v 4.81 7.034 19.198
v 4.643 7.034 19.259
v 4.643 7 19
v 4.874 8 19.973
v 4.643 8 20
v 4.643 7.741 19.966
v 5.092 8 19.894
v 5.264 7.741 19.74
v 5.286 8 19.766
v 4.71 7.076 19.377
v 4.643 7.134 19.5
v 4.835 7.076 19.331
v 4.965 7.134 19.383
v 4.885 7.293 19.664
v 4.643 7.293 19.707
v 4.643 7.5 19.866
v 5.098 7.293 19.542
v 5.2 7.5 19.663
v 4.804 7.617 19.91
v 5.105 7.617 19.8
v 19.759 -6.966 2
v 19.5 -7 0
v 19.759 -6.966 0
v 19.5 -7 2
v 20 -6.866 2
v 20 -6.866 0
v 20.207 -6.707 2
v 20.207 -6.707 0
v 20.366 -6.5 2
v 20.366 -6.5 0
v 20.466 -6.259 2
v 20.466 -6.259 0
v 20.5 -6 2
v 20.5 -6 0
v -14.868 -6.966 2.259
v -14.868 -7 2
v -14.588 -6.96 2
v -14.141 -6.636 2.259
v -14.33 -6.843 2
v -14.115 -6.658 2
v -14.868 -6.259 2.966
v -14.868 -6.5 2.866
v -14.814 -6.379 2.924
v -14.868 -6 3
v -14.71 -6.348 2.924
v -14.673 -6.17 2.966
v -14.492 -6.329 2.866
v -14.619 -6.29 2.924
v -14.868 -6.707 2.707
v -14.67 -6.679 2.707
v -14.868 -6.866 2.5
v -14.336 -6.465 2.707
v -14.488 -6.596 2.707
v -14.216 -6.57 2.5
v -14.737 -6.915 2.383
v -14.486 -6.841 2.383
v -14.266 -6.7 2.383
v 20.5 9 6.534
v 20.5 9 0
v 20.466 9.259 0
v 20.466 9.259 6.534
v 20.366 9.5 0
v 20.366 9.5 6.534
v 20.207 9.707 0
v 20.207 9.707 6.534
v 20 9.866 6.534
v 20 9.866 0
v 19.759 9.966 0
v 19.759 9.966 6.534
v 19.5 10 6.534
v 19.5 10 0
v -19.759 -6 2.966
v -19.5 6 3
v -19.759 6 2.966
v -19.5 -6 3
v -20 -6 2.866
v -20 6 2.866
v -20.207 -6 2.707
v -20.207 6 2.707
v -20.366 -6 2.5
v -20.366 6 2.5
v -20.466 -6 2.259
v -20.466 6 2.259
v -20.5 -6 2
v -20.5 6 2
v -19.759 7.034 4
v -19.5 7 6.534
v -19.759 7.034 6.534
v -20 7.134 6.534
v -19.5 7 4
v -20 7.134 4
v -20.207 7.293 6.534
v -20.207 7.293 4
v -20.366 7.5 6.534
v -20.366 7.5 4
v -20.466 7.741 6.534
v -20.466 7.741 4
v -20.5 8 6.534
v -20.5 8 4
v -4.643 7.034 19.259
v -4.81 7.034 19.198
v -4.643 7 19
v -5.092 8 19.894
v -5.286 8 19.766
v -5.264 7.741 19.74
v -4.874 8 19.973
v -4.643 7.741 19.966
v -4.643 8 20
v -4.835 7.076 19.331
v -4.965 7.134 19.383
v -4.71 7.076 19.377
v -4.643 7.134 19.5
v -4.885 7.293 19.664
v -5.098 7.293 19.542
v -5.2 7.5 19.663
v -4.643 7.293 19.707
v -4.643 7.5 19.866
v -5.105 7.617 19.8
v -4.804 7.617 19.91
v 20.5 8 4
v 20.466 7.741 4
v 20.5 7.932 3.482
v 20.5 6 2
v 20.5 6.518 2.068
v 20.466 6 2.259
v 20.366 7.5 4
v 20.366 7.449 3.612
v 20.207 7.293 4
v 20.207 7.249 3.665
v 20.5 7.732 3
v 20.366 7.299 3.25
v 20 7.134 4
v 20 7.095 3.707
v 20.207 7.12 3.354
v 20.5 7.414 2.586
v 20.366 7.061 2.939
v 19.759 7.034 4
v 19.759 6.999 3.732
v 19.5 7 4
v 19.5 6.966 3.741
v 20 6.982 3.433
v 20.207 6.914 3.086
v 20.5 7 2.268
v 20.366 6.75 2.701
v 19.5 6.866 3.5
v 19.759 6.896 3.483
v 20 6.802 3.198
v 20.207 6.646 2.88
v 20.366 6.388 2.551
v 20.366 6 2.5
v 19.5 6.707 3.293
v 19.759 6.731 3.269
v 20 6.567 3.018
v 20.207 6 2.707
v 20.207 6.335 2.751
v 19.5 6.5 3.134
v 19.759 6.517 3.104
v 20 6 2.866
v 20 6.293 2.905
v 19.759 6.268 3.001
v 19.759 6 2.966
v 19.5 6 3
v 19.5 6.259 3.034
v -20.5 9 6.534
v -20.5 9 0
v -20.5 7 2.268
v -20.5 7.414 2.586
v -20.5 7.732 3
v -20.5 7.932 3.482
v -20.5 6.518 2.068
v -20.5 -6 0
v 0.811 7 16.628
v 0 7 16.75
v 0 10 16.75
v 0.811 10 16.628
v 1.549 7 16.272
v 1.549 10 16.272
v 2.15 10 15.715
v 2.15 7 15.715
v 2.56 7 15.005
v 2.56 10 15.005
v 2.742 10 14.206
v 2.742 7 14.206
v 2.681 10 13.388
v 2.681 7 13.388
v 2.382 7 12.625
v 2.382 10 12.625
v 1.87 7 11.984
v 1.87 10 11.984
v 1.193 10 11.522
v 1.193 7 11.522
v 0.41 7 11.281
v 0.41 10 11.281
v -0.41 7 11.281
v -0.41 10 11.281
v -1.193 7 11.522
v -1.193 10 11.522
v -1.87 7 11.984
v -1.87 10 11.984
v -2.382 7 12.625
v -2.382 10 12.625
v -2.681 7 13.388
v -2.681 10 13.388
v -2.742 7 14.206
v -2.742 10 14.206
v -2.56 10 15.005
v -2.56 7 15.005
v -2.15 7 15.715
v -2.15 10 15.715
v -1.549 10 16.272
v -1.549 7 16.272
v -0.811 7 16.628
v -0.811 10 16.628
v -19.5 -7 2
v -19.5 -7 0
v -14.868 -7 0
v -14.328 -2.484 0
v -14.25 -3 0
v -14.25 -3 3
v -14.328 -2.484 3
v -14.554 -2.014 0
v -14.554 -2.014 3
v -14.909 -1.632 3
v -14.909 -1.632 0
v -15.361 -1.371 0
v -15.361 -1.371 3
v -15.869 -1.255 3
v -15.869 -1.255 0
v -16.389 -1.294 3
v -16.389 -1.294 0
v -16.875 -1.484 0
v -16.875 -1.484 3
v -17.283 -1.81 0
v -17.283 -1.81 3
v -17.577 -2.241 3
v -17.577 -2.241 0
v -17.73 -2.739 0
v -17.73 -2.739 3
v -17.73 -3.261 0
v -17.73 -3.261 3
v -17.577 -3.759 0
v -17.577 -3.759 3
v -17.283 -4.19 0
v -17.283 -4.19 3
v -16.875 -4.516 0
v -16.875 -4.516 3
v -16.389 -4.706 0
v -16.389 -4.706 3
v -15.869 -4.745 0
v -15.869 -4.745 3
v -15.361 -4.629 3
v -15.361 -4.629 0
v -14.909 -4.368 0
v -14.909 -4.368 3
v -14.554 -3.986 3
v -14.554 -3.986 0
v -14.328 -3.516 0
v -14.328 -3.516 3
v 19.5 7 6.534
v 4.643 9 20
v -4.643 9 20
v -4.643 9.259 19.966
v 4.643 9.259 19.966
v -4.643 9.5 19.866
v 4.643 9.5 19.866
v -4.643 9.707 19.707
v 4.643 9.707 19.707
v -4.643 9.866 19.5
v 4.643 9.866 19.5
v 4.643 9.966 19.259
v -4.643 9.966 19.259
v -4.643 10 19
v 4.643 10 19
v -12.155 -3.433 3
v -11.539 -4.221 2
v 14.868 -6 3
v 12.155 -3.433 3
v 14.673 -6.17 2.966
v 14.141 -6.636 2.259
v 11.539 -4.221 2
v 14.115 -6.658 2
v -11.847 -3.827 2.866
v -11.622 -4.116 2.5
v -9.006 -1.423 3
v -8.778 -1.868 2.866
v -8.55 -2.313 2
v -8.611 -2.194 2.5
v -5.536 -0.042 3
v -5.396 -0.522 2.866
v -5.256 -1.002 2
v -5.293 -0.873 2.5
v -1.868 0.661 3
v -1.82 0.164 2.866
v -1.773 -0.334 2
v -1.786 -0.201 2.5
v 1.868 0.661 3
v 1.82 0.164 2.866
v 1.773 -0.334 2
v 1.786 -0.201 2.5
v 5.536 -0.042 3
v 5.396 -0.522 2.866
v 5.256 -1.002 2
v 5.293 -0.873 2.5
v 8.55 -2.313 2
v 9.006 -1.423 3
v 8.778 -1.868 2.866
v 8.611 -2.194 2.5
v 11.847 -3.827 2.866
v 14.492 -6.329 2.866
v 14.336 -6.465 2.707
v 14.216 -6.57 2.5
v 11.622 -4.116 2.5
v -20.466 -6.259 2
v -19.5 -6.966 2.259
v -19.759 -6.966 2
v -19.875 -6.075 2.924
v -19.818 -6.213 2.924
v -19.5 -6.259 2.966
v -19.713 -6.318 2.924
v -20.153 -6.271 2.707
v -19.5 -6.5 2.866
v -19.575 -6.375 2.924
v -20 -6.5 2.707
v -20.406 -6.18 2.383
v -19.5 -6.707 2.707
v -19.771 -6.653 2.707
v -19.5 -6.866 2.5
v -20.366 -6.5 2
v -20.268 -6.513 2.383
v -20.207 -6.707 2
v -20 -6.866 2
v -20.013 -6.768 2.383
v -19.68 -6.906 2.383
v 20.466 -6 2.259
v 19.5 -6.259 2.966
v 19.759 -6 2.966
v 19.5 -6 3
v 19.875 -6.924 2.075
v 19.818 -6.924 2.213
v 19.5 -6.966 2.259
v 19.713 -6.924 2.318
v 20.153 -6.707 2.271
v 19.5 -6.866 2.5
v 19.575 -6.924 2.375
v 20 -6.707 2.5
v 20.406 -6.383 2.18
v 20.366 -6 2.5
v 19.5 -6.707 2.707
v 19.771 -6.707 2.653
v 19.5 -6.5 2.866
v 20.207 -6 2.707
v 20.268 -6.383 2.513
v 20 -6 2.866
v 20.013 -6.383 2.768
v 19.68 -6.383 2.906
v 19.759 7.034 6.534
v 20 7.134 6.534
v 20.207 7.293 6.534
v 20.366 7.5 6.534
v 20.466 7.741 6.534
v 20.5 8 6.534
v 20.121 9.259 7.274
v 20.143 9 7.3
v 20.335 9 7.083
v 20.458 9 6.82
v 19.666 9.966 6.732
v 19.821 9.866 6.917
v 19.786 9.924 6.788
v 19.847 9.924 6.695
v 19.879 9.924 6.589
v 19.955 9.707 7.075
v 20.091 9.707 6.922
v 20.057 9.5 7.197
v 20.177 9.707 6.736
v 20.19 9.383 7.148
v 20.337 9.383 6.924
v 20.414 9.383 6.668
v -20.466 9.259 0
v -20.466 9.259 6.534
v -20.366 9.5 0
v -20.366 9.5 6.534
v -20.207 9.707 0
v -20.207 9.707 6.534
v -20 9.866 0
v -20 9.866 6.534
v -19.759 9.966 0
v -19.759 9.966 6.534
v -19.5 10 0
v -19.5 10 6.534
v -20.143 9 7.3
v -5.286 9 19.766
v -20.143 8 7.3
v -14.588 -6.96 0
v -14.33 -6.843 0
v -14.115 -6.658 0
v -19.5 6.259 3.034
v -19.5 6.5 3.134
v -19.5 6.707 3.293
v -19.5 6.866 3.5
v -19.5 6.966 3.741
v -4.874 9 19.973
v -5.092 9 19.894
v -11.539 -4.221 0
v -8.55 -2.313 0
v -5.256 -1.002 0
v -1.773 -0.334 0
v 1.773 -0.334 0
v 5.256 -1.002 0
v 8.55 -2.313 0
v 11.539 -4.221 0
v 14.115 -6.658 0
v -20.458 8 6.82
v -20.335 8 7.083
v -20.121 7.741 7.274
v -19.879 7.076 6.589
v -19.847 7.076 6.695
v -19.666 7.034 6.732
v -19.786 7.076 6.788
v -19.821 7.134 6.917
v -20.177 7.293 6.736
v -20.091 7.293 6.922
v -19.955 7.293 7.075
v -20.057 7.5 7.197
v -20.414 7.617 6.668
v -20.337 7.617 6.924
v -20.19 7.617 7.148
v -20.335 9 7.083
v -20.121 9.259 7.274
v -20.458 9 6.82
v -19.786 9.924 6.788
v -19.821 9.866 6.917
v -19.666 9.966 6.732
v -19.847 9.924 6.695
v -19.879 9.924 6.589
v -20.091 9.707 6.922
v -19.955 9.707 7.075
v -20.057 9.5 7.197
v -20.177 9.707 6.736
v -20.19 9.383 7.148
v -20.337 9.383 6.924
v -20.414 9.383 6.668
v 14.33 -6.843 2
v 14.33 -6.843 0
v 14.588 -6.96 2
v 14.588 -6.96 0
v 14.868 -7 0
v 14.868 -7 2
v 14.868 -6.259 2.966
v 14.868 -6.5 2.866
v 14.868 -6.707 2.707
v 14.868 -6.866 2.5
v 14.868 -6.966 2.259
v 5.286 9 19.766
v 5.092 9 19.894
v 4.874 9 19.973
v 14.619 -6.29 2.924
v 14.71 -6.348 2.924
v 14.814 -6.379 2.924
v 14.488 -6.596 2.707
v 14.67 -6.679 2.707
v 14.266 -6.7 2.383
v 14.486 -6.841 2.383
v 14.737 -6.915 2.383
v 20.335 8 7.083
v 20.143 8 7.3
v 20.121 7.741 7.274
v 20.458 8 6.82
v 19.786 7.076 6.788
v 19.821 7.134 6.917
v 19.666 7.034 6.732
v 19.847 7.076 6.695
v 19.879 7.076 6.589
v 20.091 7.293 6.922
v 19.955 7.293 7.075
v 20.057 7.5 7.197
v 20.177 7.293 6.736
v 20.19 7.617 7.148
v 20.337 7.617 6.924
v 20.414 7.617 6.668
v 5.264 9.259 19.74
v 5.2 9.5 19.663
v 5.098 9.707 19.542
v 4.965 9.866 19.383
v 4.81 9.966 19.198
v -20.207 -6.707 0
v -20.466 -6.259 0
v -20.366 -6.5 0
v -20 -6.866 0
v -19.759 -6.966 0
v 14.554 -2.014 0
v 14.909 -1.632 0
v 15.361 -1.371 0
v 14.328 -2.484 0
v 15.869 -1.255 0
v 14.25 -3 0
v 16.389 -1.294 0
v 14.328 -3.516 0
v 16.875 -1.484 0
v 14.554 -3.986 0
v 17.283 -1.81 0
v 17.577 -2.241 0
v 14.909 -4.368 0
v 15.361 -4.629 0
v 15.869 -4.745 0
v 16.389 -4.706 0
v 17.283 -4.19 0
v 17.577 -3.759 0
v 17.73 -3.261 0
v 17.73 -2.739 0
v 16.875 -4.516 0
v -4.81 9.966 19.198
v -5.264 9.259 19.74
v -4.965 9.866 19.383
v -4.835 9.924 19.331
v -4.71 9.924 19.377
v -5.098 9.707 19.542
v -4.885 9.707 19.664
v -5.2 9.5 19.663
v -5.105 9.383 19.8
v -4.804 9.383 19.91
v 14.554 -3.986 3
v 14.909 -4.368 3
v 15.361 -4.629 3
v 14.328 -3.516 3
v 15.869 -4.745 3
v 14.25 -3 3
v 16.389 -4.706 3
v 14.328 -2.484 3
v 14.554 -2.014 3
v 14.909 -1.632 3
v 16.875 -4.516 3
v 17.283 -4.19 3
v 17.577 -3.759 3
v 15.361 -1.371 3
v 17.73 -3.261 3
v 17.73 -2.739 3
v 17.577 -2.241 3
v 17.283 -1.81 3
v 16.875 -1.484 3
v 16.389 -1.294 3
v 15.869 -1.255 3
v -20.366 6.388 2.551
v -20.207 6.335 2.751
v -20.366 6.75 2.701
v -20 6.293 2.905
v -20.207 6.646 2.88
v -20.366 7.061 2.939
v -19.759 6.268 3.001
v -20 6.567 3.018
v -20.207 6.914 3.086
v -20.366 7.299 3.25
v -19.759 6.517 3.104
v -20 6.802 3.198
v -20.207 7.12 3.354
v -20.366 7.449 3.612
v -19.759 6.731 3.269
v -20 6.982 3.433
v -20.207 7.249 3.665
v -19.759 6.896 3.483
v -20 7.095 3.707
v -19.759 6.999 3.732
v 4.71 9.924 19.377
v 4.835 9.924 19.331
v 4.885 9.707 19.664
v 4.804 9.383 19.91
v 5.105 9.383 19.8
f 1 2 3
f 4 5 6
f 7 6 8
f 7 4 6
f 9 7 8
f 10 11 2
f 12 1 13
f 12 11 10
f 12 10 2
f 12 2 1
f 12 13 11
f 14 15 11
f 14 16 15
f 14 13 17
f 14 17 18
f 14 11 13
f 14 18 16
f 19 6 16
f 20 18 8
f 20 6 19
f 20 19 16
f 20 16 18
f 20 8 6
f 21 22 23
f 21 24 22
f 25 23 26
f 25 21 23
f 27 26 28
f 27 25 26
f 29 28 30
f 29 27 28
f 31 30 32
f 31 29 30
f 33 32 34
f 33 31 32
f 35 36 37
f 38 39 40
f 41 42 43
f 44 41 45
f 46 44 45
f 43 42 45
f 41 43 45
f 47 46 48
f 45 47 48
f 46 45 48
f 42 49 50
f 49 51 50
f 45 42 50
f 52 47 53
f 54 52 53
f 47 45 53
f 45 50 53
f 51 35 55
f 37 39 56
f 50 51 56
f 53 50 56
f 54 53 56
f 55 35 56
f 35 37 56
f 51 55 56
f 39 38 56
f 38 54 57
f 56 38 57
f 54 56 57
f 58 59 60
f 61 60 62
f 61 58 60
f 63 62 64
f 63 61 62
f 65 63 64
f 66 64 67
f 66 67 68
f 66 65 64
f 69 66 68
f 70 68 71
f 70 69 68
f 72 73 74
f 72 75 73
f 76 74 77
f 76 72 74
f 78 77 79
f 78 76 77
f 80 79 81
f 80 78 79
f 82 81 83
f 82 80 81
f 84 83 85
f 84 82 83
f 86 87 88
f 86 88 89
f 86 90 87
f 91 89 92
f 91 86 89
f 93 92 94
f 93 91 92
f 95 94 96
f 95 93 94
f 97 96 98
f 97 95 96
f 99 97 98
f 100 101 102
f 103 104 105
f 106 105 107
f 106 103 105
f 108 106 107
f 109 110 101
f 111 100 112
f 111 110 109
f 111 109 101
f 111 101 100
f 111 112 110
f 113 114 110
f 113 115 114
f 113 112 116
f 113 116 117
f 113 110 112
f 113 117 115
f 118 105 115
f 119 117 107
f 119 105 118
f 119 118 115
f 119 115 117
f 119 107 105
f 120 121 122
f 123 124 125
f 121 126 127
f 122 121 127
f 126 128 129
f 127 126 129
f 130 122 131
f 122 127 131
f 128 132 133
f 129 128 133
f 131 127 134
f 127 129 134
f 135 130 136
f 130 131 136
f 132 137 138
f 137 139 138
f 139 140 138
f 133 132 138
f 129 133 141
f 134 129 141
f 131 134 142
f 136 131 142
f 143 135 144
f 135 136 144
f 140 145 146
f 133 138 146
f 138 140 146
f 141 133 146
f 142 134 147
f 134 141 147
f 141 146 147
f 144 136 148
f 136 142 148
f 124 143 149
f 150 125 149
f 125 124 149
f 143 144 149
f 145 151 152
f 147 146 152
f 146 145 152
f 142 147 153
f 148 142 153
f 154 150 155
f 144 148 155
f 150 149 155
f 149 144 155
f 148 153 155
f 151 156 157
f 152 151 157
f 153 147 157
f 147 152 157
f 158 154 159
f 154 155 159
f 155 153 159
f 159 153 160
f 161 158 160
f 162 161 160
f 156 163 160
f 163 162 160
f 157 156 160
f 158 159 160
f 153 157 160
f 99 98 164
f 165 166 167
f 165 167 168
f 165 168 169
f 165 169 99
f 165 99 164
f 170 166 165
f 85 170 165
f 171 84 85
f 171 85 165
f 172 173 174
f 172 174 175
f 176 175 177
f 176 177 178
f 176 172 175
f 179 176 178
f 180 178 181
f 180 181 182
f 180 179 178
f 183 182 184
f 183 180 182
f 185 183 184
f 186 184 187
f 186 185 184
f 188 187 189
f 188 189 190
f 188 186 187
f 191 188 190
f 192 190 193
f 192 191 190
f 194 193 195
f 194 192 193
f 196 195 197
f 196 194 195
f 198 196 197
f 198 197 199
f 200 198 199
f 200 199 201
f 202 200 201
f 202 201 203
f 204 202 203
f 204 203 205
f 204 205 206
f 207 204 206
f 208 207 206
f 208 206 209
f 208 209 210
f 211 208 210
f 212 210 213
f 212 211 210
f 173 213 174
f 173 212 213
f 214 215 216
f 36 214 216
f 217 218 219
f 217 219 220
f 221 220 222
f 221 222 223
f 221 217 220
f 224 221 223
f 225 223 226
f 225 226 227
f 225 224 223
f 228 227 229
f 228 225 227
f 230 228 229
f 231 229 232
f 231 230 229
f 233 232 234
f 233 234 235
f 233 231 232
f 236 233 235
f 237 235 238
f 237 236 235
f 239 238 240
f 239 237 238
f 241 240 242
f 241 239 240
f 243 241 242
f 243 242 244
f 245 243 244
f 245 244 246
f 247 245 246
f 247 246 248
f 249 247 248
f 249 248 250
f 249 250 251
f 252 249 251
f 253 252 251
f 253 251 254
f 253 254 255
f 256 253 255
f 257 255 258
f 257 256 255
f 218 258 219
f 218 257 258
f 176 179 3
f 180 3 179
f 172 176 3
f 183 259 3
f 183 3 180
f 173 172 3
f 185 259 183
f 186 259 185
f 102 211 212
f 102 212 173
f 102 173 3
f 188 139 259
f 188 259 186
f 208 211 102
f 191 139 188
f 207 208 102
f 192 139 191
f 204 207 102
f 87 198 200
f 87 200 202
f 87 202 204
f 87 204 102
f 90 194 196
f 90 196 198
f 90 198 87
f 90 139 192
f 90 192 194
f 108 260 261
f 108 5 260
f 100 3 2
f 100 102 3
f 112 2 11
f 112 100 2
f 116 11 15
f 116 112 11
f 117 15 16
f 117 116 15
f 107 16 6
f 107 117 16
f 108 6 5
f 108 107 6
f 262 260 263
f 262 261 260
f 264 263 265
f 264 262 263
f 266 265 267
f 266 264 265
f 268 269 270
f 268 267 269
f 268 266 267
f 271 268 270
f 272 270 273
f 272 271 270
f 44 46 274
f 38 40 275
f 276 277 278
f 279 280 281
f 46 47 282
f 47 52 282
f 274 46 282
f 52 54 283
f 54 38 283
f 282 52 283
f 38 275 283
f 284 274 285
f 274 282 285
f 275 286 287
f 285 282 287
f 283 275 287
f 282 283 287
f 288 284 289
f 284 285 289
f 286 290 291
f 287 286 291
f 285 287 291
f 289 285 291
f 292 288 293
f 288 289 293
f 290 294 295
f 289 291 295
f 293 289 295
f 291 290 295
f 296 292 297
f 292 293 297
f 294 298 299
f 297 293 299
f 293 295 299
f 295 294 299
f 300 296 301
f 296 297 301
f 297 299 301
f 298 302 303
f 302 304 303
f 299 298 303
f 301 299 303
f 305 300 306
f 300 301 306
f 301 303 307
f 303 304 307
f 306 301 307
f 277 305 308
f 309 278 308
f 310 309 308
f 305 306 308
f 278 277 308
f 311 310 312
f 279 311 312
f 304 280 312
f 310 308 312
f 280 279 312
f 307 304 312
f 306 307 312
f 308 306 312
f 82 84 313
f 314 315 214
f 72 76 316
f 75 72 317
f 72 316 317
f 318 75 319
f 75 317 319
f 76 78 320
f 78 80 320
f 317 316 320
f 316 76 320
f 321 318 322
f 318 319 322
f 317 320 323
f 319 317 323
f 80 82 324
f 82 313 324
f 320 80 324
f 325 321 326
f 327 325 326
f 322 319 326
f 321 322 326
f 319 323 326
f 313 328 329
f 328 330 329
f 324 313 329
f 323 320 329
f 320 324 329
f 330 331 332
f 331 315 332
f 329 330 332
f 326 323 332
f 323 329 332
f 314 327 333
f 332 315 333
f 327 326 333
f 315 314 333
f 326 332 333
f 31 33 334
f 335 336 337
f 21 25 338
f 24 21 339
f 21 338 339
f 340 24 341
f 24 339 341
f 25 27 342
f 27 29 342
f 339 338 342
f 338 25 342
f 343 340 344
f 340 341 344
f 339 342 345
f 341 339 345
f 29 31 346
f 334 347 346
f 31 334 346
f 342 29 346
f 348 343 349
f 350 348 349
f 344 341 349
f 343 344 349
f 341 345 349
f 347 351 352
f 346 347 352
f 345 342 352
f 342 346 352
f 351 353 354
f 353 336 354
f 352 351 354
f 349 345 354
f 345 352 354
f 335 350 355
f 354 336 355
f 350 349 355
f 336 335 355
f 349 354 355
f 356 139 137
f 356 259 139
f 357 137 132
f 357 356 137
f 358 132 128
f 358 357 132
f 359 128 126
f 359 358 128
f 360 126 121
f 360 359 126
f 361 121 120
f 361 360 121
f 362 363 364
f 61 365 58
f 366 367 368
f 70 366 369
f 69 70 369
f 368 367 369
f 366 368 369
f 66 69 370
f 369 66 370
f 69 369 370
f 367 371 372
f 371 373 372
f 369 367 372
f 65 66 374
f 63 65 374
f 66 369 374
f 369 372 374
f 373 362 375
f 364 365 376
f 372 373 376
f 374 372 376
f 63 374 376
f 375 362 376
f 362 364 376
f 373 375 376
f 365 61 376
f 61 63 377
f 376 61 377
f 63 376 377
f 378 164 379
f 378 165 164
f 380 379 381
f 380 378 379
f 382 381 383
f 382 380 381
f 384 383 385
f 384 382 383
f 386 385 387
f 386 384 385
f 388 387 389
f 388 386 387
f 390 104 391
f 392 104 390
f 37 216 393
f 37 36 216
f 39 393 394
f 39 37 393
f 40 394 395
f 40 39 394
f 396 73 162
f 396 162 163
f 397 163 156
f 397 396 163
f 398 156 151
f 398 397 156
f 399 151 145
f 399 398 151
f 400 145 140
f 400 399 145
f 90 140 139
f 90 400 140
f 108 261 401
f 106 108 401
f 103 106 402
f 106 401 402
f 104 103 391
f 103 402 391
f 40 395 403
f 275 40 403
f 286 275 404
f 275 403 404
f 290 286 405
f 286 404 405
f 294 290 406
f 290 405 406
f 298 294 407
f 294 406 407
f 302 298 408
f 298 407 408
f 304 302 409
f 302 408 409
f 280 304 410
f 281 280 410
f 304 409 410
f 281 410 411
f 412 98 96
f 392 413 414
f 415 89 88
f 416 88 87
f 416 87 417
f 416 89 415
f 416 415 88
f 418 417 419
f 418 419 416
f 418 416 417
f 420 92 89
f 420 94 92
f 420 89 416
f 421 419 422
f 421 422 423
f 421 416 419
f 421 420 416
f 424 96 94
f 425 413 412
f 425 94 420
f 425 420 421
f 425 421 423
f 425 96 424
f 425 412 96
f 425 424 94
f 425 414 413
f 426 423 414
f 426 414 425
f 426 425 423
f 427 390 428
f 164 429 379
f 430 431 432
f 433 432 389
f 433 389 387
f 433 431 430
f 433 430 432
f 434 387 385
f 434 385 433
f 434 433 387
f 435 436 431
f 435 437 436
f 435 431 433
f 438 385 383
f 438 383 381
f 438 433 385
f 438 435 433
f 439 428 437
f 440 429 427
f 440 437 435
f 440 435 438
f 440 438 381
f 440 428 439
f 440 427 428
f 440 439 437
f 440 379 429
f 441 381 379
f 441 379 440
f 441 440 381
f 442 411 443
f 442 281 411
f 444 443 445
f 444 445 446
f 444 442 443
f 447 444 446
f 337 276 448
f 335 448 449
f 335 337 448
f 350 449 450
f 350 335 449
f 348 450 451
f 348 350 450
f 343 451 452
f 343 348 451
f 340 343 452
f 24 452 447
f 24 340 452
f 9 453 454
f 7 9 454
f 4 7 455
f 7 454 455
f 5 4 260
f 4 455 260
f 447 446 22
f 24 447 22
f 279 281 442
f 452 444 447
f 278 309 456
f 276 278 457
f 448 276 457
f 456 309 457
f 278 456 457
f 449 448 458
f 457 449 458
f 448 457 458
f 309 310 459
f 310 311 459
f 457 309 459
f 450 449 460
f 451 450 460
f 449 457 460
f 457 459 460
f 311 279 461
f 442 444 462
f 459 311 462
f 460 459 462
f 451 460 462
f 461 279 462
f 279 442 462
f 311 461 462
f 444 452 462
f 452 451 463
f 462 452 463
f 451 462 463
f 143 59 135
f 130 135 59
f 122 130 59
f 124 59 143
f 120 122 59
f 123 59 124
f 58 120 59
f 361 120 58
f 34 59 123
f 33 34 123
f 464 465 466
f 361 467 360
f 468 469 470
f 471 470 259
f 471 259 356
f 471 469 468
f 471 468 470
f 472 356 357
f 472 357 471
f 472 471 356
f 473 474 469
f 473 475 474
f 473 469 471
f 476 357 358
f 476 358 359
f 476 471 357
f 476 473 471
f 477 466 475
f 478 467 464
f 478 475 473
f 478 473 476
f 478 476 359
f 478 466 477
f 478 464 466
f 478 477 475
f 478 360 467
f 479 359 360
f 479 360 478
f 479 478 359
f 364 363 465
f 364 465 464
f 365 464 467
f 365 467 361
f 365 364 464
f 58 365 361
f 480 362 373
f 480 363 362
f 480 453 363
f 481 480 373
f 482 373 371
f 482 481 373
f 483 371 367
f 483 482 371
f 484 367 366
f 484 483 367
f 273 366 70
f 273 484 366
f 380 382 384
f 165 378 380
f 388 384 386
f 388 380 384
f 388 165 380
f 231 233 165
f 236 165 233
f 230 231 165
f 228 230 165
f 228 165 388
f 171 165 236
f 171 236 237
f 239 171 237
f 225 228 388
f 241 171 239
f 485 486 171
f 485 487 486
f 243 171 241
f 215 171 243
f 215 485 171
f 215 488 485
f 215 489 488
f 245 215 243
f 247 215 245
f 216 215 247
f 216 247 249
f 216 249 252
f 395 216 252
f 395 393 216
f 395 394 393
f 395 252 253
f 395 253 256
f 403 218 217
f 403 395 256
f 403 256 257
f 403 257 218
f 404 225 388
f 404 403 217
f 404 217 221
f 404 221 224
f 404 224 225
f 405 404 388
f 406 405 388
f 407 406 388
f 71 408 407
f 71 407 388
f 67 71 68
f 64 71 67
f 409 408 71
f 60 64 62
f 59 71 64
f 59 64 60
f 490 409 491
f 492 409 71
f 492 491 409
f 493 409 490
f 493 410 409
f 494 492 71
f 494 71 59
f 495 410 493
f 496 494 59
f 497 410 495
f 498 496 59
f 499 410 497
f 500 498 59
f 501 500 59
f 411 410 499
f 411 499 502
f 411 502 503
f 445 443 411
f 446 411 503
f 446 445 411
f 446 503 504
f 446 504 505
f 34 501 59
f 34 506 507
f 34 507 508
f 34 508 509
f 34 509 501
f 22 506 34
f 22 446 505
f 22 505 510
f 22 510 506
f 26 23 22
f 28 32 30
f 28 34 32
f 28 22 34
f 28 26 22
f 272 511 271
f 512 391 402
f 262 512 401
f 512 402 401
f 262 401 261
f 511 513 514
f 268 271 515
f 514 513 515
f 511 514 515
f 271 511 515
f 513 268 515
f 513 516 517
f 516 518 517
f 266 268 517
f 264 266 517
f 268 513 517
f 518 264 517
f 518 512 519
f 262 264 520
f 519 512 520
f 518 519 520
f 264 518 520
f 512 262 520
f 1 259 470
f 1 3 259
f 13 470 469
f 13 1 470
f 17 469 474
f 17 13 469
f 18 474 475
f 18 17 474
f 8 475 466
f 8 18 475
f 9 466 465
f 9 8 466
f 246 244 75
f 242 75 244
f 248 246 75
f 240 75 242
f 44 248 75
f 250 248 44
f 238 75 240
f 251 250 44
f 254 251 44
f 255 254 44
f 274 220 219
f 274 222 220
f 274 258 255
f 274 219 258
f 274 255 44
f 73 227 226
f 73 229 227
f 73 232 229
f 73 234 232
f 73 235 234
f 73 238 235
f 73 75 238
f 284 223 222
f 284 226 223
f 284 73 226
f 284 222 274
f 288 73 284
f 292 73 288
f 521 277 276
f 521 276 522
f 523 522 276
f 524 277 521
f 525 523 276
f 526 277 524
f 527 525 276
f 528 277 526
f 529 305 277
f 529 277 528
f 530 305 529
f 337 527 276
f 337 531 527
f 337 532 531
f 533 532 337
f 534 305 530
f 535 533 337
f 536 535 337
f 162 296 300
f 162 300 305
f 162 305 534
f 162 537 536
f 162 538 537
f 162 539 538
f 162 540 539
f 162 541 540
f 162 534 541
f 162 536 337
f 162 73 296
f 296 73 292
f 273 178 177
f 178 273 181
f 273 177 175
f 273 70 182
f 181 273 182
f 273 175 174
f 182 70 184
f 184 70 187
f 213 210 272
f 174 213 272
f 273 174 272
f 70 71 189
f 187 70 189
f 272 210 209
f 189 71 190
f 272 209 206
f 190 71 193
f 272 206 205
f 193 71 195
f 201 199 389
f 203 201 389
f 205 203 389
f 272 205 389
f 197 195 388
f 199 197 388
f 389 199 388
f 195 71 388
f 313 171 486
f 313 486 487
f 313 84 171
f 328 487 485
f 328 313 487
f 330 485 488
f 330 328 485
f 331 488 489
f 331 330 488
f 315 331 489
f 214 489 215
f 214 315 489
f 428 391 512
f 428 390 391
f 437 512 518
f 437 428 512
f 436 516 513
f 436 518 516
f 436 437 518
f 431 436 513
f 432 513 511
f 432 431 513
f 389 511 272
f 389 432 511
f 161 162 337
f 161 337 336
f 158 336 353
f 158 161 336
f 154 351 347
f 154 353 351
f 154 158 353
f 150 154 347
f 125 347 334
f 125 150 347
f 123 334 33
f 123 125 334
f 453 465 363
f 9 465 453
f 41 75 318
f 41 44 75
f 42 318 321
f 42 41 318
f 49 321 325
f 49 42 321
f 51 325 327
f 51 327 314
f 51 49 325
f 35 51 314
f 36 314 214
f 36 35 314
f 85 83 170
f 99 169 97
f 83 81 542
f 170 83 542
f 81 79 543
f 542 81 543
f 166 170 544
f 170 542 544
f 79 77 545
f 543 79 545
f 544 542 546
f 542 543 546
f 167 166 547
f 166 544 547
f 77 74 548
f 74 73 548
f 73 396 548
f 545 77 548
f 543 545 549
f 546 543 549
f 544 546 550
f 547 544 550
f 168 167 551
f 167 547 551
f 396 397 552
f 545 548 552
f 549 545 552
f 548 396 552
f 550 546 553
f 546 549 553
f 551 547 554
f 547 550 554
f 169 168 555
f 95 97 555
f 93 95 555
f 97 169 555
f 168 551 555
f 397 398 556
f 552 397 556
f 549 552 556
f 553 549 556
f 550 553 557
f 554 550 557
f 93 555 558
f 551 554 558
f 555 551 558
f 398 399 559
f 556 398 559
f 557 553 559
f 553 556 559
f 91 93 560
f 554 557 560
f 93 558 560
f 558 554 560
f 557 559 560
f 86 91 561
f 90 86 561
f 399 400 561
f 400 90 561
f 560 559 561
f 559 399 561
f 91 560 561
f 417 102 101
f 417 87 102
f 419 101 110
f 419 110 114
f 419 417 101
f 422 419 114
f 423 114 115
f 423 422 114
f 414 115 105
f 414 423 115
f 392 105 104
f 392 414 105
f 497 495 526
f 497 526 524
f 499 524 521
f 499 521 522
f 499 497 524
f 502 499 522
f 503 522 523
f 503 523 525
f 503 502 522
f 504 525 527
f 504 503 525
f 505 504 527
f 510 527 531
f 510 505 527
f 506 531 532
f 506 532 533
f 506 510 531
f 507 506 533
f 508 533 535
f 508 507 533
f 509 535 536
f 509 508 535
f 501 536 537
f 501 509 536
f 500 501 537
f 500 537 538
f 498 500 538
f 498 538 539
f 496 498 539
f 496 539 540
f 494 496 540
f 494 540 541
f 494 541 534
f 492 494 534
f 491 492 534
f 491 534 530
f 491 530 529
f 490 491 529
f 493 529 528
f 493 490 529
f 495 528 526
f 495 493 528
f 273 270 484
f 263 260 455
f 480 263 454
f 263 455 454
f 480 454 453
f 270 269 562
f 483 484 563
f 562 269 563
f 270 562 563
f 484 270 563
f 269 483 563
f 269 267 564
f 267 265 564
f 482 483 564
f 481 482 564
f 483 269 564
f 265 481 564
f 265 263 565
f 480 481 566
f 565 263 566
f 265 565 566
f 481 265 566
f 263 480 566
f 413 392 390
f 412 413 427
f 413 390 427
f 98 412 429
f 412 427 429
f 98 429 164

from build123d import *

# Parameters (mm, degrees)
SKETCH1_R           = 1.75
BOSS_EXTRUDE1_DEPTH = 3
SKETCH2_R           = 2.75
BOSS_EXTRUDE2_DEPTH = 3
FILLET1_R           = 1


with BuildPart() as part:
    # Sketch1 → Boss-Extrude1 (new body)
    with BuildSketch(Plane.XY):
        with BuildLine():
            Line((-20.5, 7), (-20.5, -7))
            Line((-20.5, -7), (-14.407029534, -7))
            ThreePointArc((-14.407029534, -7), (0, -0.25), (14.407029534, -7))
            Line((14.407029534, -7), (20.5, -7))
            Line((20.5, -7), (20.5, 7))
            Line((20.5, 7), (-20.5, 7))
        make_face()
        with Locations((-16, -3)):
            Circle(SKETCH1_R, mode=Mode.SUBTRACT)
        with Locations(Location((16, -3, 0), (0, 0, 180))):
            Circle(SKETCH1_R, mode=Mode.SUBTRACT)
    extrude(amount=BOSS_EXTRUDE1_DEPTH)

    # Sketch2 → Boss-Extrude2 (add)
    with BuildSketch(Plane(origin=(0, 7, 0), x_dir=(1, 0, 0), z_dir=(0, 1, 0))):
        Polygon((-20.5, 0), (20.5, 0), (20.5, -7), (5.007203296, -20), (-5.007203296, -20), (-20.5, -7), align=None)
        with Locations(Location((0, -14, 0), (0, 0, 270))):
            Circle(SKETCH2_R, mode=Mode.SUBTRACT)
    extrude(amount=BOSS_EXTRUDE2_DEPTH)

    # Fillet1
    fillet1_edges = [part.edges().sort_by_distance(p)[0] for p in [
        (20.5, 0, 3),
        (-14.407029534, -7, 1.5),
        (-20.5, -7, 1.5),
        (20.5, -7, 1.5),
        (14.407029534, -7, 1.5),
        (0, 7, 3),
        (-20.5, 0, 3),
        (-17.453514767, -7, 3),
        (-12.753601648, 10, 13.5),
        (0, 10, 20),
        (12.753601648, 10, 13.5),
        (20.5, 10, 3.5),
        (-20.5, 10, 3.5),
        (-12.753601648, 7, 13.5),
        (-20.5, 8.5, 7),
        (0, 7, 20),
        (-5.007203296, 8.5, 20),
        (12.753601648, 7, 13.5),
        (5.007203296, 8.5, 20),
        (20.5, 7, 5),
        (20.5, 8.5, 7),
        (-20.5, 7, 5),
        (0, -0.25, 3),
        (17.453514767, -7, 3),
    ]]
    fillet(fillet1_edges, radius=FILLET1_R)


solid = part.part
